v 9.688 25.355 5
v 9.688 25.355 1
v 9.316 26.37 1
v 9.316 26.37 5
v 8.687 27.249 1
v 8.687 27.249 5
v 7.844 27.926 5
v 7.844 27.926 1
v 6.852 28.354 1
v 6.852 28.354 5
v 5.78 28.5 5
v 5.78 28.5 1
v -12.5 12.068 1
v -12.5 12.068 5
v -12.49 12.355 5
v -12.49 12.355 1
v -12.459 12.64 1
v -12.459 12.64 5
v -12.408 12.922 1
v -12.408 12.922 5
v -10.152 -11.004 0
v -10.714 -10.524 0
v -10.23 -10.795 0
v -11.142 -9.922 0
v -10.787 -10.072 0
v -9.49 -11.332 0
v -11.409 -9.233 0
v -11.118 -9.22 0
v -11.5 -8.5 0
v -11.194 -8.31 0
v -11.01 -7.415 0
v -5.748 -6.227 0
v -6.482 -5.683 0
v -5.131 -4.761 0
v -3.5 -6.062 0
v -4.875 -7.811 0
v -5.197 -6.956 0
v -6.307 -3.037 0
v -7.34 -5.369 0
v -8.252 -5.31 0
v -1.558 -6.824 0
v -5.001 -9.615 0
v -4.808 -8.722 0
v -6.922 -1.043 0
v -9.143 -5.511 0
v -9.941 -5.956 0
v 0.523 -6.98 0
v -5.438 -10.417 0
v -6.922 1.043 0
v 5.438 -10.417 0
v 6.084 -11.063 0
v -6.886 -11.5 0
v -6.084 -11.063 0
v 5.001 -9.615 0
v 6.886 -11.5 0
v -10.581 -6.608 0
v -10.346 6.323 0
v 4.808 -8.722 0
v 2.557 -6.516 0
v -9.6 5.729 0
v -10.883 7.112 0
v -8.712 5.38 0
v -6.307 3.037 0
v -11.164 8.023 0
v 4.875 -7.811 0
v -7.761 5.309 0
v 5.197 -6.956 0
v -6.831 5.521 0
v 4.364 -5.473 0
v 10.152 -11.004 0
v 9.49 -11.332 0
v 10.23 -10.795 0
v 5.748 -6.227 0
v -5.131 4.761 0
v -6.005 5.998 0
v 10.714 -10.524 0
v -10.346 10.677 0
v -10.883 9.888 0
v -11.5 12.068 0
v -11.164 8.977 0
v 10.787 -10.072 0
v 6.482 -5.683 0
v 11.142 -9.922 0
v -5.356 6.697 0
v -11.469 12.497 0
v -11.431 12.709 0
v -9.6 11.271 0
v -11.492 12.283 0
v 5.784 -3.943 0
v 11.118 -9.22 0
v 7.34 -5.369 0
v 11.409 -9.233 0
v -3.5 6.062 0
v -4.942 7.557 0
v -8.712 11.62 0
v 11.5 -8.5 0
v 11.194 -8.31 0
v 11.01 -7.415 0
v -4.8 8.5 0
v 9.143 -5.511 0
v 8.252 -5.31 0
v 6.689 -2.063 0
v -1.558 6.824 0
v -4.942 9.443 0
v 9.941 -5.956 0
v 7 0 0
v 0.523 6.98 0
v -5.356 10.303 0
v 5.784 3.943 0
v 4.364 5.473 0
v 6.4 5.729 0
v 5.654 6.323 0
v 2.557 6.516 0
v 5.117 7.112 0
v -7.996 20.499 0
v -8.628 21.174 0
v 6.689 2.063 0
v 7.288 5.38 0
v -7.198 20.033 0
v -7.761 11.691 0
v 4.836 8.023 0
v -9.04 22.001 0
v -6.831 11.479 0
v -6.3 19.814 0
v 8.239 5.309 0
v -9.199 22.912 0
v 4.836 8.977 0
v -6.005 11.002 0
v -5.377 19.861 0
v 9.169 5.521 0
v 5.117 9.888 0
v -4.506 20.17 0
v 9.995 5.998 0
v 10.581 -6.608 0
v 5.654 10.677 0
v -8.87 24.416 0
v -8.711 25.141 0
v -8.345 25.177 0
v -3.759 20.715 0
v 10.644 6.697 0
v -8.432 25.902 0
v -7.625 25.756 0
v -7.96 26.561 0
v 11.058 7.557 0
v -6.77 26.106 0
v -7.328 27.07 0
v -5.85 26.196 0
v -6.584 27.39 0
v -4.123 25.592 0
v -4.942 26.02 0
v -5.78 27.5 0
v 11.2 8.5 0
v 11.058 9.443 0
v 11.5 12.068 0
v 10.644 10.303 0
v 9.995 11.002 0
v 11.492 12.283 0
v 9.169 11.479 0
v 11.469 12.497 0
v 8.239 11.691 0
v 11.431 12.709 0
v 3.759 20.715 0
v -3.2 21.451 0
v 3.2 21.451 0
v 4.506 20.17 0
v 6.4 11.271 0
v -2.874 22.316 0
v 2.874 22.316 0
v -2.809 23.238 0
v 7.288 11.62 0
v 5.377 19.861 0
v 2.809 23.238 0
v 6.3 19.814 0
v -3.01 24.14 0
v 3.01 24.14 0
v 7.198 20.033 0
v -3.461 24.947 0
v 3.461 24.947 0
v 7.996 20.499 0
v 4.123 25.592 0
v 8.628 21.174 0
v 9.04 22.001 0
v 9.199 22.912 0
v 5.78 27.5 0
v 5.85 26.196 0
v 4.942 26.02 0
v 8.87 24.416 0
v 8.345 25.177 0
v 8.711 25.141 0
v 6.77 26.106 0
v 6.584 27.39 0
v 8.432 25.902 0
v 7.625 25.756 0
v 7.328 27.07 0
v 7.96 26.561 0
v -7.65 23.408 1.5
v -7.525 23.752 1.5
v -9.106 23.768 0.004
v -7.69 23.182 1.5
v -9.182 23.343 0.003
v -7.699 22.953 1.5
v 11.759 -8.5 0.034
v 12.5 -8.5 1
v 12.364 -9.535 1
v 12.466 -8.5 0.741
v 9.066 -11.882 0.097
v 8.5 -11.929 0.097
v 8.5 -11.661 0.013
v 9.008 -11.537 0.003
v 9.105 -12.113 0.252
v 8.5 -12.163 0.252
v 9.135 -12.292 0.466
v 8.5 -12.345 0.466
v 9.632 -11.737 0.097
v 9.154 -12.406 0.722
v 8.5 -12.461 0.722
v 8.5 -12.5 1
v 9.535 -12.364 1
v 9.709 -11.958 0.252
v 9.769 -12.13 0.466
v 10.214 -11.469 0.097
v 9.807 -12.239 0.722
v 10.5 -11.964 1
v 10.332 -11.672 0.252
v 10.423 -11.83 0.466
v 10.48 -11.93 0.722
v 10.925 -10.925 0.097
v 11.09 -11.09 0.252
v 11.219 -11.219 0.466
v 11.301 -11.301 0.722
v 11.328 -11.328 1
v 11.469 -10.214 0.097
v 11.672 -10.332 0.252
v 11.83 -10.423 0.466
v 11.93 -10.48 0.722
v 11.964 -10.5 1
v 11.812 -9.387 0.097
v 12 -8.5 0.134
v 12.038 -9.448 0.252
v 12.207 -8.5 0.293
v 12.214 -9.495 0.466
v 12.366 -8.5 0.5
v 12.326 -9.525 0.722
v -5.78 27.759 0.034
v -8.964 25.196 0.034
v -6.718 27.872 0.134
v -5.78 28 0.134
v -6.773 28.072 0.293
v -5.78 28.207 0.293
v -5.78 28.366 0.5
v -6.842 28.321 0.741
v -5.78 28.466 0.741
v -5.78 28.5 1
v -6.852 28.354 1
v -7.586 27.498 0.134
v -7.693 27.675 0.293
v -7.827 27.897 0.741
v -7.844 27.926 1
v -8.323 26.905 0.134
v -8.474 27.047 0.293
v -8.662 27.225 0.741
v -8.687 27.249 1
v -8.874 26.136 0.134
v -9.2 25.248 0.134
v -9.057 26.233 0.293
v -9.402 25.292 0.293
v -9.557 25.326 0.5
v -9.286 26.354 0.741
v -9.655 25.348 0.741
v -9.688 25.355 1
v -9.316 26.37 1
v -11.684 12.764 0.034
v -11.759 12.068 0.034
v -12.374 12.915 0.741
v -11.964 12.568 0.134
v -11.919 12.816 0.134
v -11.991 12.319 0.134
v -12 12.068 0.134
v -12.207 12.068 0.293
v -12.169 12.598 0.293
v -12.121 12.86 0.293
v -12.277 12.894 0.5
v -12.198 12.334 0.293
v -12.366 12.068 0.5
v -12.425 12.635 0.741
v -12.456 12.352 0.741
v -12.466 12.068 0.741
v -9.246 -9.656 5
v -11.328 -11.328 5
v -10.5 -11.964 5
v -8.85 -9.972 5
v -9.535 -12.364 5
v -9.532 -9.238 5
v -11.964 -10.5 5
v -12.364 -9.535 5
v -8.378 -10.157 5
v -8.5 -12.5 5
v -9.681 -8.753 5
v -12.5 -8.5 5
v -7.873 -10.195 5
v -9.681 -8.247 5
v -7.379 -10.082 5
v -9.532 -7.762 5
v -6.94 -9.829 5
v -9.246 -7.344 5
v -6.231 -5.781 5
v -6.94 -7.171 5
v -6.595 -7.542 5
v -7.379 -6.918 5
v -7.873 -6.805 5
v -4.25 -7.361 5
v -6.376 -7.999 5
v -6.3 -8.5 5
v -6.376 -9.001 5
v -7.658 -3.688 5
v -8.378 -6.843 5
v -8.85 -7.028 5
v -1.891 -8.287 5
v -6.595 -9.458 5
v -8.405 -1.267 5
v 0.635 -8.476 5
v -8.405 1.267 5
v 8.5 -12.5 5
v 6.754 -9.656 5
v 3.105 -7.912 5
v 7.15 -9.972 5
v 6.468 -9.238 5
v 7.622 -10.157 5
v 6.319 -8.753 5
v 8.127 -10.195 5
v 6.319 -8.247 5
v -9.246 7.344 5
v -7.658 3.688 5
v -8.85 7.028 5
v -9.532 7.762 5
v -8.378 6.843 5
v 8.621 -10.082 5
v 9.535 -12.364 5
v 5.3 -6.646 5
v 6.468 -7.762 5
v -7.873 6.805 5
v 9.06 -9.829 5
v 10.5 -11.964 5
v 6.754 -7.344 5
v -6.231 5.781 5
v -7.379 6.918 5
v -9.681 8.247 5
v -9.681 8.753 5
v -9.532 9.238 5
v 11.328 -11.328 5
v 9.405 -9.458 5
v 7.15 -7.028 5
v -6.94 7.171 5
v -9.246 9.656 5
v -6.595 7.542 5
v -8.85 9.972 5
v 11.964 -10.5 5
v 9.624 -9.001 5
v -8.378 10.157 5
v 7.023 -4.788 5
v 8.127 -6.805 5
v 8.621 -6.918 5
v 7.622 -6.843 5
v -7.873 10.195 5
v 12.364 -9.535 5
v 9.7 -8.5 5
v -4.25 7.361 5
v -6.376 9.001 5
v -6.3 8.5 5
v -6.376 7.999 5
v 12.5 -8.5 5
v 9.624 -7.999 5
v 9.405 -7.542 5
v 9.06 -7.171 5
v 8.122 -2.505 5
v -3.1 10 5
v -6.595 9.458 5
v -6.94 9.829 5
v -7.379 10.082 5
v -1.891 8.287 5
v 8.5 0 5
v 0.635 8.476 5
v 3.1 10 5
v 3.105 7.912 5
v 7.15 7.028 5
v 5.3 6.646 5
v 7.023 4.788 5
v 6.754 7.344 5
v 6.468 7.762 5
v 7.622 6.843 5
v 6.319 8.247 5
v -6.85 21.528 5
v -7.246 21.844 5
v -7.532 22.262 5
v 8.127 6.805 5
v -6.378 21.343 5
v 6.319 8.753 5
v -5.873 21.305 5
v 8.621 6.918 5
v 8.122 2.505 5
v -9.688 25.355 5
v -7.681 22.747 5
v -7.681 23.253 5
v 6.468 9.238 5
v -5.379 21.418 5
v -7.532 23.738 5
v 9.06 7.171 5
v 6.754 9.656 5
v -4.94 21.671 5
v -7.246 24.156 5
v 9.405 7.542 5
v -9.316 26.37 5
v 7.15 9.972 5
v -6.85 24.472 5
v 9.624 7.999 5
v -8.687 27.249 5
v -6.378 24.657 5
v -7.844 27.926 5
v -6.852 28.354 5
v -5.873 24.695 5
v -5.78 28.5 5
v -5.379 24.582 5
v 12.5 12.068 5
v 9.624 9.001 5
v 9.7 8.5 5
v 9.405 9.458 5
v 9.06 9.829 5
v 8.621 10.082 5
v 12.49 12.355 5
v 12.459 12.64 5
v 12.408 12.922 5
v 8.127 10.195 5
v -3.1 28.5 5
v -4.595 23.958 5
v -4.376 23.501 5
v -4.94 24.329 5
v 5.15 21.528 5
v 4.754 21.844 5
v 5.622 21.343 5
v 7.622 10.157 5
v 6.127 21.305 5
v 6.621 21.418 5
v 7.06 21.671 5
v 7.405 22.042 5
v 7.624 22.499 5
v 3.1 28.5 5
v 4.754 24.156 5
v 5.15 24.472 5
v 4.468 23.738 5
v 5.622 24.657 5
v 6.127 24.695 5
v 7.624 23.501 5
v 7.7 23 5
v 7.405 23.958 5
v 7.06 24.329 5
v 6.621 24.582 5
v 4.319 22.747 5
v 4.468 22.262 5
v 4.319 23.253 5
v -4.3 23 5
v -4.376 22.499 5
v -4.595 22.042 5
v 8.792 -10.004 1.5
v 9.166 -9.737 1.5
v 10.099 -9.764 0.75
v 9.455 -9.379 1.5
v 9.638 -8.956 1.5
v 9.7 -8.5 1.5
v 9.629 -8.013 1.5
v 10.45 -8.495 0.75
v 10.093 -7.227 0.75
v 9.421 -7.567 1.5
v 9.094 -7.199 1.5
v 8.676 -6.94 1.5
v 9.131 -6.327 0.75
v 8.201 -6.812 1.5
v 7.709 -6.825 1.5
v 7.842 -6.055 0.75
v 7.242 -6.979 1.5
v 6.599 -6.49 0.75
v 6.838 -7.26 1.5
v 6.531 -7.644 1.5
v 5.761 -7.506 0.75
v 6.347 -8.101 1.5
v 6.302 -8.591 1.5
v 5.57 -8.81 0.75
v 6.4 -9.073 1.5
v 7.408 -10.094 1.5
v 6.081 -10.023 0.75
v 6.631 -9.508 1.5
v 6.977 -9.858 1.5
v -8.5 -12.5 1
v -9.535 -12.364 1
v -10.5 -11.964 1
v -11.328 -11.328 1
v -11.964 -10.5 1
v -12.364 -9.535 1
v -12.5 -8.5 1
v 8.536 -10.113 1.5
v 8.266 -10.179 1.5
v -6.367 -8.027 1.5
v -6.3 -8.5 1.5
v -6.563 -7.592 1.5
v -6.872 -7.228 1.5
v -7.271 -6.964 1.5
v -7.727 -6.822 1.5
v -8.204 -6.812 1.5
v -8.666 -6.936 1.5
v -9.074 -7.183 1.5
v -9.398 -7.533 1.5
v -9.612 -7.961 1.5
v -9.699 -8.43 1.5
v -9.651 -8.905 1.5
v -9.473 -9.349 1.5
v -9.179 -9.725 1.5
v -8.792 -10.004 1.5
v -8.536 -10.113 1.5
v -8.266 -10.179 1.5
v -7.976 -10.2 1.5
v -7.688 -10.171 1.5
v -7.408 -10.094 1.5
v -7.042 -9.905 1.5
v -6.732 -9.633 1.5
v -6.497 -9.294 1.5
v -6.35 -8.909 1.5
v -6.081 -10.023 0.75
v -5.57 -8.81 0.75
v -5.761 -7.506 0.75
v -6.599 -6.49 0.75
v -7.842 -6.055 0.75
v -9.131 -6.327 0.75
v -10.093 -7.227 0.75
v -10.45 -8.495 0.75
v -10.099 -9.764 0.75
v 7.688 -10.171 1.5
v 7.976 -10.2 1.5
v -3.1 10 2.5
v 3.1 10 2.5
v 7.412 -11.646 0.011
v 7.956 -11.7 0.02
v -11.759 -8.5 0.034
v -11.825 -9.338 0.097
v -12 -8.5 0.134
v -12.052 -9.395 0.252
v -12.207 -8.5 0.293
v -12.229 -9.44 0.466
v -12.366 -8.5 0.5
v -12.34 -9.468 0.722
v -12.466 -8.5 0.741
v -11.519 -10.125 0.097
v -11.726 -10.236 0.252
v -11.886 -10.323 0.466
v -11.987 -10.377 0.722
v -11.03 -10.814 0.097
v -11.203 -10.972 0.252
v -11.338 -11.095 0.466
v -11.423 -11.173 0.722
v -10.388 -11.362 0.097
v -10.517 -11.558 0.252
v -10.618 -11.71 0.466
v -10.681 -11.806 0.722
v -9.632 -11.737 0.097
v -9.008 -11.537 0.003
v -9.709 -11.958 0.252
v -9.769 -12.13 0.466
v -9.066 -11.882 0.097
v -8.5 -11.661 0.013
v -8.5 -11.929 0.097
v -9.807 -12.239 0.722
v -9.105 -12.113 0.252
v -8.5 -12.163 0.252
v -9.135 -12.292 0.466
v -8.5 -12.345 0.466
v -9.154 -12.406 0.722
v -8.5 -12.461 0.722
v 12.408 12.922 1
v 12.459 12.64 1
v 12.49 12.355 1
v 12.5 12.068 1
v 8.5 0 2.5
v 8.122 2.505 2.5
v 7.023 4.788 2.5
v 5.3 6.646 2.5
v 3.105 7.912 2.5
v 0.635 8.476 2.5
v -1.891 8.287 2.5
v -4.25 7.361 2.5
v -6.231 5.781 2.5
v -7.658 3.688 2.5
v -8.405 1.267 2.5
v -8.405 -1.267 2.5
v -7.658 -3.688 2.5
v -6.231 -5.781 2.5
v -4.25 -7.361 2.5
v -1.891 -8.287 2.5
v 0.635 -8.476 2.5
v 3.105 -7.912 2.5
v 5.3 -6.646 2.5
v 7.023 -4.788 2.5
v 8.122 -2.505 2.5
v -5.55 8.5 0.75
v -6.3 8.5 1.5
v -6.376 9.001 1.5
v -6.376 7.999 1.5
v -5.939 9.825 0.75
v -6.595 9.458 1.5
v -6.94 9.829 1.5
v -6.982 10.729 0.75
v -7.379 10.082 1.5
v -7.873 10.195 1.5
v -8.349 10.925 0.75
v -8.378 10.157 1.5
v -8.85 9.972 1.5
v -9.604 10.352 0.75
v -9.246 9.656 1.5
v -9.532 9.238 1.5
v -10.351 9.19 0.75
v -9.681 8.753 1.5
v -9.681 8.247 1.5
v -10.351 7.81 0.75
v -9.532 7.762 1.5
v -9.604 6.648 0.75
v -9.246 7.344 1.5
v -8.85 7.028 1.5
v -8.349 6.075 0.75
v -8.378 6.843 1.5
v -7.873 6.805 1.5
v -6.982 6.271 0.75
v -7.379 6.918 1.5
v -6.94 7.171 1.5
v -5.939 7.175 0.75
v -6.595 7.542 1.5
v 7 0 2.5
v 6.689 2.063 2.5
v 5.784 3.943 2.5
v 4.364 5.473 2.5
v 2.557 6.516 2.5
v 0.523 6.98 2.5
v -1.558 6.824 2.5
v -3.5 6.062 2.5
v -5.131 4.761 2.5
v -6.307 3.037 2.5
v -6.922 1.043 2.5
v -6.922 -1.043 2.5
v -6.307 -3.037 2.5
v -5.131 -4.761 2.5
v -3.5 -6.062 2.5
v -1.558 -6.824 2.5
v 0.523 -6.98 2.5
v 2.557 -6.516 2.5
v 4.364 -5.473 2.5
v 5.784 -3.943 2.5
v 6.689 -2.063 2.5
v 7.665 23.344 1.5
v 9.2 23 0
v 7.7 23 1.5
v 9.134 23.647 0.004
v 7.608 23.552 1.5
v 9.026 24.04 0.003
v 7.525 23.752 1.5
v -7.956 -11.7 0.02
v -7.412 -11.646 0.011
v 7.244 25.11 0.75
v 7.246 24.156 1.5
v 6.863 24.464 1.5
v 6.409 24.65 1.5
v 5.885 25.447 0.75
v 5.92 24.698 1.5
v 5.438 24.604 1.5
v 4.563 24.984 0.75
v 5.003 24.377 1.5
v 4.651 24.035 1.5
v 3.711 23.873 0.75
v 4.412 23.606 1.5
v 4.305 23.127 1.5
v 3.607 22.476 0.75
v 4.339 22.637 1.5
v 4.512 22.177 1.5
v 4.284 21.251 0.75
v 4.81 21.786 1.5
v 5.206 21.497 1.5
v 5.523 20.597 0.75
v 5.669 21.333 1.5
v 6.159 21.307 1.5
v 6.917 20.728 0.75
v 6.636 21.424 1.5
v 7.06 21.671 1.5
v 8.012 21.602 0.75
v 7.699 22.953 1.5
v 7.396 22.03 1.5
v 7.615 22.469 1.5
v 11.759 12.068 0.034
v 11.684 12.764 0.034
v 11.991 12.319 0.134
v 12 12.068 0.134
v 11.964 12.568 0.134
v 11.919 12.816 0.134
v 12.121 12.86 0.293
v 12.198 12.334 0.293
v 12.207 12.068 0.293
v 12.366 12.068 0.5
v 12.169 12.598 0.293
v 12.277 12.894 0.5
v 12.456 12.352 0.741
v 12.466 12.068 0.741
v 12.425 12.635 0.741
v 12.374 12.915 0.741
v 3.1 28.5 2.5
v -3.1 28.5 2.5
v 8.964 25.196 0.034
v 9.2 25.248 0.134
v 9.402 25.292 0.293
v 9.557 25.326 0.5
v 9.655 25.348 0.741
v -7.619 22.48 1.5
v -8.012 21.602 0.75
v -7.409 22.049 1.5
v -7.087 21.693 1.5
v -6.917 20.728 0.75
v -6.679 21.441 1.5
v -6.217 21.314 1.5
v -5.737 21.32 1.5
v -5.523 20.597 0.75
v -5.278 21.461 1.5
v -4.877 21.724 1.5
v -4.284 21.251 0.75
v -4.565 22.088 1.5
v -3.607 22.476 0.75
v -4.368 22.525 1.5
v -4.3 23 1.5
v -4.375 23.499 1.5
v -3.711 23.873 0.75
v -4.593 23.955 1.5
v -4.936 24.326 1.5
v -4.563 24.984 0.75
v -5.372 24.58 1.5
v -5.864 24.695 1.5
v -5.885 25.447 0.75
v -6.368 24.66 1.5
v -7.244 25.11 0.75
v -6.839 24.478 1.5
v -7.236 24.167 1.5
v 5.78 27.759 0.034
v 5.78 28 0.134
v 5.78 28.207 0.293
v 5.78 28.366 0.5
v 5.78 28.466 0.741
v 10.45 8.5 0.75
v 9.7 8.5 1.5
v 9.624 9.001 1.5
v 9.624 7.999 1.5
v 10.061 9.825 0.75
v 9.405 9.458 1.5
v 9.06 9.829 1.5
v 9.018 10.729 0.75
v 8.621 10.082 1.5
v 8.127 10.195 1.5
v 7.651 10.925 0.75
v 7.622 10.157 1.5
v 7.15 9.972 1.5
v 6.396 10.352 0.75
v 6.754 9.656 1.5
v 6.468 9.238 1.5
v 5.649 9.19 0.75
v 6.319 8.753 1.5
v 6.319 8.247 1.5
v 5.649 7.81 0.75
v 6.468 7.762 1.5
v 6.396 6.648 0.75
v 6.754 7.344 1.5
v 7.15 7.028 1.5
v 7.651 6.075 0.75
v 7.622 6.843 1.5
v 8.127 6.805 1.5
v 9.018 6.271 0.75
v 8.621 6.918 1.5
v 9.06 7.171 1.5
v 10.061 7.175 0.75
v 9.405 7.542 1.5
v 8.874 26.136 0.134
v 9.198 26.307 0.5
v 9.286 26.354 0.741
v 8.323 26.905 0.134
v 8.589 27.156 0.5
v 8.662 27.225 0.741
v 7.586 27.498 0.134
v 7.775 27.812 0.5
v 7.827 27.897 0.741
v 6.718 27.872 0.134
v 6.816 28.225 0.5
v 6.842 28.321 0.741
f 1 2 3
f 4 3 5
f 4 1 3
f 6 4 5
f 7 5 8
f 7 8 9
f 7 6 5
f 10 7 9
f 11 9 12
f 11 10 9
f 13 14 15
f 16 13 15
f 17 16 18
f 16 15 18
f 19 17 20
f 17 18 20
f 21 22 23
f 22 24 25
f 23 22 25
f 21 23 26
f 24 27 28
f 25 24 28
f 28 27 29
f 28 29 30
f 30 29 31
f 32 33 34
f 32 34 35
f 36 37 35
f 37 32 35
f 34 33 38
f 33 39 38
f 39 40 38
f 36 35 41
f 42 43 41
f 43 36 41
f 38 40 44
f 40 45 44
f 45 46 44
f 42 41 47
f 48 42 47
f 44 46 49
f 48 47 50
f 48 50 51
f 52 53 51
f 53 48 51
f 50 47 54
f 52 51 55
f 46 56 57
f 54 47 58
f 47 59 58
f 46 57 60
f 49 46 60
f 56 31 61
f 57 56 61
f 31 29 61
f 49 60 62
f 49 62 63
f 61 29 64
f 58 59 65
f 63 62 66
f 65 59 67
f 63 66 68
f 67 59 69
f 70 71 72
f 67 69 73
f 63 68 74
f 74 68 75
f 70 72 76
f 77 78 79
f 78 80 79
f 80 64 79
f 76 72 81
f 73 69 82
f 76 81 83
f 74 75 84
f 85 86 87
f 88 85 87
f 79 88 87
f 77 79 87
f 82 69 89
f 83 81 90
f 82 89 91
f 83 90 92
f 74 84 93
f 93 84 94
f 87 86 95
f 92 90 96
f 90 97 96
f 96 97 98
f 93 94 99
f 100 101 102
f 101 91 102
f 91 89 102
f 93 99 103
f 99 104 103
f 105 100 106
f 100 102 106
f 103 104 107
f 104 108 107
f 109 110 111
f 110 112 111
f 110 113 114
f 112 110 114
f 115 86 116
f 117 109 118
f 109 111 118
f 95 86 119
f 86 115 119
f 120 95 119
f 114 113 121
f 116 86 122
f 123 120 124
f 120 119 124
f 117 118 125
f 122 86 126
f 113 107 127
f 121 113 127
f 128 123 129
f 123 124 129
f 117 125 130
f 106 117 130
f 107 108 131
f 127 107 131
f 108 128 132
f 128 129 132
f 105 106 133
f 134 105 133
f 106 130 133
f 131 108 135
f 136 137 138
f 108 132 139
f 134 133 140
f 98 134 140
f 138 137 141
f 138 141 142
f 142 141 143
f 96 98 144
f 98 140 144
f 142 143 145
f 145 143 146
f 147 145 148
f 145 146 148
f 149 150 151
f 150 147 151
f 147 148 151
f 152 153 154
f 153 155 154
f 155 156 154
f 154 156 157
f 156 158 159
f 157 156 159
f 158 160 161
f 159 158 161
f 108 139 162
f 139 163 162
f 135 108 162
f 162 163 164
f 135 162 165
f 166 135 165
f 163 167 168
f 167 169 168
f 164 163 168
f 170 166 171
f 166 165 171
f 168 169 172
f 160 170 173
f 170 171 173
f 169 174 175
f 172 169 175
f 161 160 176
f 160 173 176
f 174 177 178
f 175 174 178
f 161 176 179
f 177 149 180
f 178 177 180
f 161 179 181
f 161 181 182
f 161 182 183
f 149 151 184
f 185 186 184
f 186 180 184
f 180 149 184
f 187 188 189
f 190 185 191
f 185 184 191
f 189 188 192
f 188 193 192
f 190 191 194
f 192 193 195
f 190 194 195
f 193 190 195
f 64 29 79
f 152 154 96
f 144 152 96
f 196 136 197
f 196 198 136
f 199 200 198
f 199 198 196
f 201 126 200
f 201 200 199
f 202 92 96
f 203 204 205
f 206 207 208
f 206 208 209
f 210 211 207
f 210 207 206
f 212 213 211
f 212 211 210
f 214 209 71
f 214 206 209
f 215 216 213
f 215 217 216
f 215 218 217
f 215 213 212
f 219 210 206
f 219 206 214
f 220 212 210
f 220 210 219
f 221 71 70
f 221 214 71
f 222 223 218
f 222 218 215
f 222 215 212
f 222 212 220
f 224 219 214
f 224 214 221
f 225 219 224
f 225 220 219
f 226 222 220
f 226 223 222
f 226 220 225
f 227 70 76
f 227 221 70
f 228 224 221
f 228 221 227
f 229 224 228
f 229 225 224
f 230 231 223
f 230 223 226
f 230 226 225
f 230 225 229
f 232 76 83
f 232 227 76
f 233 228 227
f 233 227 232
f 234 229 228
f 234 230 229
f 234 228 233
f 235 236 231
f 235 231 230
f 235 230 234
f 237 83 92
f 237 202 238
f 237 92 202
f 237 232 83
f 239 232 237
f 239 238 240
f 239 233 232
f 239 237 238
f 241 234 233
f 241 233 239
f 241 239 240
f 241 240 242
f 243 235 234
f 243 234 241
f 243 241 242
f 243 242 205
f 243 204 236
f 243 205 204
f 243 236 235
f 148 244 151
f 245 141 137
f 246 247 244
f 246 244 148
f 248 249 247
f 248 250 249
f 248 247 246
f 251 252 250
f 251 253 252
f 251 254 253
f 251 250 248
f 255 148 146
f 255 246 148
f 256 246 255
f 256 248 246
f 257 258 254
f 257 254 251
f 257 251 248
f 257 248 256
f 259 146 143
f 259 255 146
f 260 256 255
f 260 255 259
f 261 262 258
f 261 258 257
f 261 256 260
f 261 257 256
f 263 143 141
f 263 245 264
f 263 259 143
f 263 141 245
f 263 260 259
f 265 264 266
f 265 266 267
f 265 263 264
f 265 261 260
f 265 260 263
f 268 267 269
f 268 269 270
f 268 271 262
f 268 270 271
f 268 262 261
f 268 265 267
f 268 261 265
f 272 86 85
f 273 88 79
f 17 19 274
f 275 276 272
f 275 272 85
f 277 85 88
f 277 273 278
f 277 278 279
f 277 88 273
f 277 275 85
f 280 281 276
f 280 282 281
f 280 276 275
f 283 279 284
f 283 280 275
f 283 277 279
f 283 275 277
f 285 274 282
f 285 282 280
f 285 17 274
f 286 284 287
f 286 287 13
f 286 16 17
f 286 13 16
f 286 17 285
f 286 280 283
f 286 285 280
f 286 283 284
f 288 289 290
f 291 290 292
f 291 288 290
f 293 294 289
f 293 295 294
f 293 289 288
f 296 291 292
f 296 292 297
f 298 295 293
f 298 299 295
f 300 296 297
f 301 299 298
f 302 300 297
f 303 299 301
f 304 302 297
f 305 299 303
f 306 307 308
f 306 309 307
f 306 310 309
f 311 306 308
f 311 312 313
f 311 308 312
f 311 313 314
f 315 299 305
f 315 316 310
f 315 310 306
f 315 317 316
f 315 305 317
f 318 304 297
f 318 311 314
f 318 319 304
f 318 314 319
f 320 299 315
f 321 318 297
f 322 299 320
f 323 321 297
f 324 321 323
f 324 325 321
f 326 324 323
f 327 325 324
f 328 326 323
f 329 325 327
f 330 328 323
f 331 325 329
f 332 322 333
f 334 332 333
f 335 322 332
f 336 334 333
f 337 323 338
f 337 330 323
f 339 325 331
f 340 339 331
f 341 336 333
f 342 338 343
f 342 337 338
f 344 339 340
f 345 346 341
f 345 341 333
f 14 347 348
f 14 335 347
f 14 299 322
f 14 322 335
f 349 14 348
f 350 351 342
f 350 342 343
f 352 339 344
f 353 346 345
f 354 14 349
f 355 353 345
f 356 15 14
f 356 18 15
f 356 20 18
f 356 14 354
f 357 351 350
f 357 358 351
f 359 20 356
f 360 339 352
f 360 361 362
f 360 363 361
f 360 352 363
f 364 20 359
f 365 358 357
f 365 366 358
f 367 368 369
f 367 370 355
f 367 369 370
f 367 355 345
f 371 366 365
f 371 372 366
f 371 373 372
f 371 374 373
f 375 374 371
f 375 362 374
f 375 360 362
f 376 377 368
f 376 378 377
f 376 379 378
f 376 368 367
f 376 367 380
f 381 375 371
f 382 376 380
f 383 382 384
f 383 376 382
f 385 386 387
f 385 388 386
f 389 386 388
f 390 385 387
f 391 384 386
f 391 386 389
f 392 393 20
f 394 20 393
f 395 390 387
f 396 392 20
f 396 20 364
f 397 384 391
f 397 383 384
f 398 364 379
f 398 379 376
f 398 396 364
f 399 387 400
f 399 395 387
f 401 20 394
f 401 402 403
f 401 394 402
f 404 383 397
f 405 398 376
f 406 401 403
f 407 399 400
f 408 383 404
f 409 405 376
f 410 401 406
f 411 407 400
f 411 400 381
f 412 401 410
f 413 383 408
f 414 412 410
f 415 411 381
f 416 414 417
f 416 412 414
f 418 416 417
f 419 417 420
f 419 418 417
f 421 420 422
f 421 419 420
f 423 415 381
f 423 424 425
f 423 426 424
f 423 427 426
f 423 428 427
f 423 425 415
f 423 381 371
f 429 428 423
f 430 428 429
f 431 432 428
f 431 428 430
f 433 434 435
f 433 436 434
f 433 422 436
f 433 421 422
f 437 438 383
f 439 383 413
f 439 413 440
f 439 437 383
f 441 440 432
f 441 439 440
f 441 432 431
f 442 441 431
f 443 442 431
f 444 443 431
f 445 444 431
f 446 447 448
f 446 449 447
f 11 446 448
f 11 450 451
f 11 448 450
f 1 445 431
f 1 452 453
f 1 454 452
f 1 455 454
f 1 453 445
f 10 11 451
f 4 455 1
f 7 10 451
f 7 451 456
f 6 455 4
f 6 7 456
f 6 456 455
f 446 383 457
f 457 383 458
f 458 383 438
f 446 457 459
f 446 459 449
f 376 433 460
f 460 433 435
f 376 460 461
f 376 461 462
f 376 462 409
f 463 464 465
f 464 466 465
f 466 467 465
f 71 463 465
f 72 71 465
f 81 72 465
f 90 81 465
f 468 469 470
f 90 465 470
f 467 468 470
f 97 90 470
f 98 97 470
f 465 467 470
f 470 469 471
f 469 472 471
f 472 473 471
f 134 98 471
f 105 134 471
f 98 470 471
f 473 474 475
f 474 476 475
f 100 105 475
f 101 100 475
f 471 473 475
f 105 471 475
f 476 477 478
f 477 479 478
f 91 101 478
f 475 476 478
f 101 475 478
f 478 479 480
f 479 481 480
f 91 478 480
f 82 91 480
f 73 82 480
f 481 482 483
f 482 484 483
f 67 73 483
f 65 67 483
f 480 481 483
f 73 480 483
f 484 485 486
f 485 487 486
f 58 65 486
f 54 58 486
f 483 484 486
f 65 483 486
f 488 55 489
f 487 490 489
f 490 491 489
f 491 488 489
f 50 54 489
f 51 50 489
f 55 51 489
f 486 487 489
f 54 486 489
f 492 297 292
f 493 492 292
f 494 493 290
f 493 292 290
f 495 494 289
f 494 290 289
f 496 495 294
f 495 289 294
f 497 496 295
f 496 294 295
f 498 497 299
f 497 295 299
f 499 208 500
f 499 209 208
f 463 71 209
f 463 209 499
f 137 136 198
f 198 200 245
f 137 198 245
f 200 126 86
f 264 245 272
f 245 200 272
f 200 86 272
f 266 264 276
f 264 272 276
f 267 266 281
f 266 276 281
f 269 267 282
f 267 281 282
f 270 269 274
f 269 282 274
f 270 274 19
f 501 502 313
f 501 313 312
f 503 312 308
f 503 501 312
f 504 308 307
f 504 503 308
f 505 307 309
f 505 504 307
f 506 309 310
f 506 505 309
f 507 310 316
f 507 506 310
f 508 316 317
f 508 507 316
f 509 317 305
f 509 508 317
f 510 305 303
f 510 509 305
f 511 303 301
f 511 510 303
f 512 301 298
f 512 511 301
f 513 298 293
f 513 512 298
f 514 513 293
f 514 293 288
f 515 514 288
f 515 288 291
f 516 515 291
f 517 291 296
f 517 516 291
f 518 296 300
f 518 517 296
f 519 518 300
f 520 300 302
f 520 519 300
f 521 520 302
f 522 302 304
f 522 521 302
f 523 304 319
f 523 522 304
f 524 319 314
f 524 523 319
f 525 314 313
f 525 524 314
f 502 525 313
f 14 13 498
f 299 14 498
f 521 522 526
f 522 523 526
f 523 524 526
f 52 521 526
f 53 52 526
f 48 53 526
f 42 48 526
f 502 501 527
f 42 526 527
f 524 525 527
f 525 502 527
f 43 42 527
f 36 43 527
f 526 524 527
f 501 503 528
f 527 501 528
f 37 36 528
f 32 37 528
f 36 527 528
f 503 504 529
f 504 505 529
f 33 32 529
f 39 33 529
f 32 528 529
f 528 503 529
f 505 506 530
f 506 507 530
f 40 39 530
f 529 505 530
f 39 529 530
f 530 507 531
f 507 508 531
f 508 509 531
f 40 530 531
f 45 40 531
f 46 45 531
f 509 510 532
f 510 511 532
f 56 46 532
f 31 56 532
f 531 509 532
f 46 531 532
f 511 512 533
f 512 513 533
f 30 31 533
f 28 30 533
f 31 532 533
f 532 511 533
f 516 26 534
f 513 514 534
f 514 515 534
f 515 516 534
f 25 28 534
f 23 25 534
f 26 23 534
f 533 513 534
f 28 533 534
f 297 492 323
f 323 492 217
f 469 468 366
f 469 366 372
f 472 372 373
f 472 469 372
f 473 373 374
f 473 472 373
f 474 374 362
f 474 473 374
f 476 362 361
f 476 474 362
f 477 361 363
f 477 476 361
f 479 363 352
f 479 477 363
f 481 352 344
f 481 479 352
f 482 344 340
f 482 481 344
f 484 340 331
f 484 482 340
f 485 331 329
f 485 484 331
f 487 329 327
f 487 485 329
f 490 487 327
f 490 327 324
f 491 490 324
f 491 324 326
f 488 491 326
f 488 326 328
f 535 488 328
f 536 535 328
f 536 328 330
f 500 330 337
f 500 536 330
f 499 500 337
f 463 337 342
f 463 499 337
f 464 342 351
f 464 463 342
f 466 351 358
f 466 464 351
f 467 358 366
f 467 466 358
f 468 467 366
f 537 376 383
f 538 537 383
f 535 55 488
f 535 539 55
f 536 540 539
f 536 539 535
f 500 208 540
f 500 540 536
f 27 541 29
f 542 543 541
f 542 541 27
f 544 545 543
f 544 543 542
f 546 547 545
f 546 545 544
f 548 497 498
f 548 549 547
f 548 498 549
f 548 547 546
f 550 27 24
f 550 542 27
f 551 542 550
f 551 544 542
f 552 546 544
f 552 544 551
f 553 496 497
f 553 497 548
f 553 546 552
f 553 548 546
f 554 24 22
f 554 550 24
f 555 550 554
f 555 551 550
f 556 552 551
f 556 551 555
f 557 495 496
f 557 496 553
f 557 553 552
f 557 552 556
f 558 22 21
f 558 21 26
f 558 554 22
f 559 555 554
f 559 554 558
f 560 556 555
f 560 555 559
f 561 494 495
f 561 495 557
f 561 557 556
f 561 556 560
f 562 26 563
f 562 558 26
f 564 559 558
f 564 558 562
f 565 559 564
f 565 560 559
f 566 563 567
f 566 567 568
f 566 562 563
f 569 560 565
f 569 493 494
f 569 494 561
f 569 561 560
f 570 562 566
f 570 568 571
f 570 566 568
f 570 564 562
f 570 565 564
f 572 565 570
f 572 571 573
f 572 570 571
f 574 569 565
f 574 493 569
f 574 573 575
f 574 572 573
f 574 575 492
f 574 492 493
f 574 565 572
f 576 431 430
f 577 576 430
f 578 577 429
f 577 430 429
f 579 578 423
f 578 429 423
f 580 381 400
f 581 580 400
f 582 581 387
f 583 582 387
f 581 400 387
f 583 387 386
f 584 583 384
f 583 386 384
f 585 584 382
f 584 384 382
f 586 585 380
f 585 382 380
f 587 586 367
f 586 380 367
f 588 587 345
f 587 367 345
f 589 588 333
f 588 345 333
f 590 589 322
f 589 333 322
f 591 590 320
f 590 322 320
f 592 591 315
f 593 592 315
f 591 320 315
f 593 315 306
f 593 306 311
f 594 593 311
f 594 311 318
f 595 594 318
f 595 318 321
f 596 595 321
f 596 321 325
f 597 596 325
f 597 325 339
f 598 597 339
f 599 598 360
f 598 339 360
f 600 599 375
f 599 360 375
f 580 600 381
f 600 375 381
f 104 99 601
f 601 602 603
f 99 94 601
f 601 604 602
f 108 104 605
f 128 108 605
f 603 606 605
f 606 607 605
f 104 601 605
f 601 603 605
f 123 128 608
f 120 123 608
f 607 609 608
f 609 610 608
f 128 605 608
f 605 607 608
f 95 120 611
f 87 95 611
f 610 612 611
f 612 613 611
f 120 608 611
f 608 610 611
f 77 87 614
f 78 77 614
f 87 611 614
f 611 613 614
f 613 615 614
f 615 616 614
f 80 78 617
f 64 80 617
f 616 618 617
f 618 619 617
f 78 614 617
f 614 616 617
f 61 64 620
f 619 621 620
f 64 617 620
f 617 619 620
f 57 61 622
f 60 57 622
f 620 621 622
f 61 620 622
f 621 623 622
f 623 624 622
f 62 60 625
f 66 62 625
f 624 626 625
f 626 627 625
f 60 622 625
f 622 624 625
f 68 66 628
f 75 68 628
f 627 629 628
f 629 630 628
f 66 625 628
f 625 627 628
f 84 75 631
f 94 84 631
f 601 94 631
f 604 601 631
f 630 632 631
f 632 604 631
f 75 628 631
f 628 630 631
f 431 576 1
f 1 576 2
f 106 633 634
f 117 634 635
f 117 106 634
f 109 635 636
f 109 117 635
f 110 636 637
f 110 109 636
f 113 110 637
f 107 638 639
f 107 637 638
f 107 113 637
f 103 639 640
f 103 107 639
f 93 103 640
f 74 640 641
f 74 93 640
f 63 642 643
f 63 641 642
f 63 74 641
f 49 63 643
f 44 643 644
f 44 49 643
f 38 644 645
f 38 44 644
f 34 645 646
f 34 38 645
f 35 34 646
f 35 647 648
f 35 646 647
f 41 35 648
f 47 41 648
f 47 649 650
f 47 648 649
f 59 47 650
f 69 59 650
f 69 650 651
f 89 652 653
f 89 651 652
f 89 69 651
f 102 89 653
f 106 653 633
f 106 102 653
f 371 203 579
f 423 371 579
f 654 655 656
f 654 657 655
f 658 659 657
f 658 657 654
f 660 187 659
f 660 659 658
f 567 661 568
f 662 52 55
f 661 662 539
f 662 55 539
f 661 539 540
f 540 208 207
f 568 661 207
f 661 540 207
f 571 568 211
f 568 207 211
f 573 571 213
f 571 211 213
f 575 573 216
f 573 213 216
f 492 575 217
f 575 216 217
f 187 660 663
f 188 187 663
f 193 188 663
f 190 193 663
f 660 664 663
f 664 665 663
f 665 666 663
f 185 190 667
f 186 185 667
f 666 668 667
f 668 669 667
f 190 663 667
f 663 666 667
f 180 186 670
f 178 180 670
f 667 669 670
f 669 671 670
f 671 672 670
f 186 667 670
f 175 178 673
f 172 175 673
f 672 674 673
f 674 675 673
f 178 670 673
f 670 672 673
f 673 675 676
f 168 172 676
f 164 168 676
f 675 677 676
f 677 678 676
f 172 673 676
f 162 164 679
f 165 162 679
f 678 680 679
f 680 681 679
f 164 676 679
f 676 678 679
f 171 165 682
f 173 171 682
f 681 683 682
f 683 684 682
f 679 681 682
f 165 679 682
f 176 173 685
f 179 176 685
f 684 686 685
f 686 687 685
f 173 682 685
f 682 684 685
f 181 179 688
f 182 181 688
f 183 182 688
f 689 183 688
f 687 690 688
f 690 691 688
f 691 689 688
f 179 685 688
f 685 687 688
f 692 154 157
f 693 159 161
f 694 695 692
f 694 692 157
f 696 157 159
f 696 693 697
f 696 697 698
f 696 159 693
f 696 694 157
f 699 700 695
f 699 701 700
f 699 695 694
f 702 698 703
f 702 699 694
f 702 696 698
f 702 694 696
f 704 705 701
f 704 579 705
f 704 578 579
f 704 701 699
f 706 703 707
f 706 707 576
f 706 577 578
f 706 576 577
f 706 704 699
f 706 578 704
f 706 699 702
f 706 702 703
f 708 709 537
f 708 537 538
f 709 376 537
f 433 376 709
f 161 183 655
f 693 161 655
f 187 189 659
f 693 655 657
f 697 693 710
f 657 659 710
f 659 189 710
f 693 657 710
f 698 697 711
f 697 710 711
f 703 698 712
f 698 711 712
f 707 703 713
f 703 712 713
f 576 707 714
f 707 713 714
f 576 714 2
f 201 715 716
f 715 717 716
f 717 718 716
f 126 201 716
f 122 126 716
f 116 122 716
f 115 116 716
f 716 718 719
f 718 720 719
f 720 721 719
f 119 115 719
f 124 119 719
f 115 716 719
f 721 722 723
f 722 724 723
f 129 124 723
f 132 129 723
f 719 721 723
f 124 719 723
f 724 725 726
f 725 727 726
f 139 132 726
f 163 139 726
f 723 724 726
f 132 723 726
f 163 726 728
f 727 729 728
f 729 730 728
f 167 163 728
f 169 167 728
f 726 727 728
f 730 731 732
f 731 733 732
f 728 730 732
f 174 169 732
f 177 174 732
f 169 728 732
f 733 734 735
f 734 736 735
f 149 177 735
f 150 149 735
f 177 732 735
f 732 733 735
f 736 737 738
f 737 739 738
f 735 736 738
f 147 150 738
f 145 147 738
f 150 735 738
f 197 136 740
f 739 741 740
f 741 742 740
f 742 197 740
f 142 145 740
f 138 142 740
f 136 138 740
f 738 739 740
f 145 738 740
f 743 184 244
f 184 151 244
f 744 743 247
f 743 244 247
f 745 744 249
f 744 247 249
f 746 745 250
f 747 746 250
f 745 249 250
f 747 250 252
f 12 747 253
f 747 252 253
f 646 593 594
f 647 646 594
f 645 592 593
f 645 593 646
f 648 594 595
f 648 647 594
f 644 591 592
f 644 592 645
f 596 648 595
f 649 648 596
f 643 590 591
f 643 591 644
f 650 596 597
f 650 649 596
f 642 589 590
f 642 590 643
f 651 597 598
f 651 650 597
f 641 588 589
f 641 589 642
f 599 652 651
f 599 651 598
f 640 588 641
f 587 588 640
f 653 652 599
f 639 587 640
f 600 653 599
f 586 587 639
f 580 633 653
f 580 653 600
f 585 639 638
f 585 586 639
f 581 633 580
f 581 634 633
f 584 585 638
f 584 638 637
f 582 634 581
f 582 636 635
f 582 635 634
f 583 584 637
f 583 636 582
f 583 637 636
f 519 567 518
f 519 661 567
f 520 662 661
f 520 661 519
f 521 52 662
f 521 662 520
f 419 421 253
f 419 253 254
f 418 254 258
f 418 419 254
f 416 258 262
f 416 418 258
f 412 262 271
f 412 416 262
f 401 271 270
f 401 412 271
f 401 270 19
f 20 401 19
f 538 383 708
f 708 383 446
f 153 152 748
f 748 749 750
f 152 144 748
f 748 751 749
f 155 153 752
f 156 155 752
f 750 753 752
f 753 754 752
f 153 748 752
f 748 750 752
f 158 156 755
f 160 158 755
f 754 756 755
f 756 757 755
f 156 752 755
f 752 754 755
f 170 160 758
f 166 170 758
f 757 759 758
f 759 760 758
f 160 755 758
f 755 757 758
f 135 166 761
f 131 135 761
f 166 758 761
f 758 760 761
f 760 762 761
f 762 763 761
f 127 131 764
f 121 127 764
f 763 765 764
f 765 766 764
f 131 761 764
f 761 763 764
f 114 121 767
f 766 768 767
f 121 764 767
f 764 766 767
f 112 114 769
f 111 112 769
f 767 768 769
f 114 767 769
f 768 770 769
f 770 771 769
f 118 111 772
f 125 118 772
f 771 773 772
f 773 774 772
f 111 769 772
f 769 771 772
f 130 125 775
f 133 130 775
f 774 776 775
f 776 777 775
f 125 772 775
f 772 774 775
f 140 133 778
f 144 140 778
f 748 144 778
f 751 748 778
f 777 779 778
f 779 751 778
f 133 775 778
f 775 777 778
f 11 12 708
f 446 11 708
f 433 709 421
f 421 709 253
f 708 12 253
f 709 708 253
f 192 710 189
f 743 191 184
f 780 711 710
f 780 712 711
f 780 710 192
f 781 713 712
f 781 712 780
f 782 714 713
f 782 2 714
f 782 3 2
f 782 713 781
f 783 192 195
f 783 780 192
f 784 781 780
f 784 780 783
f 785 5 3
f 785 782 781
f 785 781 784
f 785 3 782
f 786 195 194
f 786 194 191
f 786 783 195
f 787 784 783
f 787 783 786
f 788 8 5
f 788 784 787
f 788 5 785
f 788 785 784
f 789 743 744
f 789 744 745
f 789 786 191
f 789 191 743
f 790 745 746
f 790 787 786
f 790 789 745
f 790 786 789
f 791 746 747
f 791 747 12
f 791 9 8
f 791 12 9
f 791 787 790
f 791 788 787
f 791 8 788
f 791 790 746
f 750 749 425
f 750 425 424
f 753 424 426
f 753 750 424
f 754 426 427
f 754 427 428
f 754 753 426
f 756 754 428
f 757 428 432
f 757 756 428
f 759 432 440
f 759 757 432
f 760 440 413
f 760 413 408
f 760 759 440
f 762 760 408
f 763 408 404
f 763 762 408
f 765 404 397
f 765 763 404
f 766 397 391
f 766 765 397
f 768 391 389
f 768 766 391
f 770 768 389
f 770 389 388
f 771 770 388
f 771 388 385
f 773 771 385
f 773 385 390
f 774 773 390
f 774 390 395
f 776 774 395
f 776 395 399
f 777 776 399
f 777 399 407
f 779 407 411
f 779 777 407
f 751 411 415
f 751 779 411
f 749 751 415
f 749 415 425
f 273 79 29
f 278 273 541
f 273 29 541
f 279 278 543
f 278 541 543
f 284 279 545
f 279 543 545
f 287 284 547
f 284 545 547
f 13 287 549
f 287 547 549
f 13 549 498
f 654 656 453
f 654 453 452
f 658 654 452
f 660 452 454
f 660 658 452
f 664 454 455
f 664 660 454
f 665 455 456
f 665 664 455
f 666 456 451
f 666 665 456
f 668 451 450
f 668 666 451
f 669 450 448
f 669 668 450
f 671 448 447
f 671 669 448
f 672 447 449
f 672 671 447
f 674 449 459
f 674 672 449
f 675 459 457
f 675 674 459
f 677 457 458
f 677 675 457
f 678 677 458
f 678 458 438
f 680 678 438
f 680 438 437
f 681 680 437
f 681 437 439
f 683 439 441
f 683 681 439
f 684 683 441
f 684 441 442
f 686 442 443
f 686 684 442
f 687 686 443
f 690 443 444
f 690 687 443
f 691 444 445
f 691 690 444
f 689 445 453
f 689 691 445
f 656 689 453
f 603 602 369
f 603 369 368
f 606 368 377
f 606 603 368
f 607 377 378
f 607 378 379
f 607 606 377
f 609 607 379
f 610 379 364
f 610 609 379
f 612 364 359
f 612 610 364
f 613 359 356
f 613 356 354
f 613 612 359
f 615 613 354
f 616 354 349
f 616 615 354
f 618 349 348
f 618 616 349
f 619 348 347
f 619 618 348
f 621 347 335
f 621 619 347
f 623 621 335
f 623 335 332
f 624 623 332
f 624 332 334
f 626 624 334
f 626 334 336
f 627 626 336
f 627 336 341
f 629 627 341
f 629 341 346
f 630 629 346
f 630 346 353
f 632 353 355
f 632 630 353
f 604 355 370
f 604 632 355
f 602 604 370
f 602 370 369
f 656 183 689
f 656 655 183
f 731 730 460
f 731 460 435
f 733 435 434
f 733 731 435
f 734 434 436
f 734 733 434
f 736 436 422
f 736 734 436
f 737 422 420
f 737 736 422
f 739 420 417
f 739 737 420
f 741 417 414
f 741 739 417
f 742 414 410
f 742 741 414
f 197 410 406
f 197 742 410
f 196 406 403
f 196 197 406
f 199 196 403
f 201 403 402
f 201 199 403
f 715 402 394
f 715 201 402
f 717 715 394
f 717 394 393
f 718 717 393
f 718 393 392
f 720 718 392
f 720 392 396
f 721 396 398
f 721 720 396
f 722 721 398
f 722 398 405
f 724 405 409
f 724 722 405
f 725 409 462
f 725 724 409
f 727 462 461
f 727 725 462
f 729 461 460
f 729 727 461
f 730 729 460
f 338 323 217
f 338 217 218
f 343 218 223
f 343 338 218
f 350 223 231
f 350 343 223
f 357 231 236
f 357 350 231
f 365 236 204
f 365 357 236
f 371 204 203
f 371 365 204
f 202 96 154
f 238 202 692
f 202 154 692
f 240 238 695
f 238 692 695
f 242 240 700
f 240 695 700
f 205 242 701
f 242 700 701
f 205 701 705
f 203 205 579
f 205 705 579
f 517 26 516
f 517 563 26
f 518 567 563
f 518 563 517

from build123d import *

# Parameters (mm, degrees)
SKETCH_R        = 7
SKETCH_R_2      = 1.7
PAD_DEPTH       = 5
SKETCH001_R     = 8.5
SKETCH001_W     = 6.2
SKETCH001_H     = 20
POCKET_DEPTH    = 2.5
FILLET_R        = 4
FILLET001_R     = 4
FILLET002_R     = 4
FILLET003_R     = 4
FILLET004_R     = 4
FILLET005_R     = 4
FILLET006_R     = 1
CHAMFER_SIZE    = 1.5
CHAMFER001_SIZE = 1.5
CHAMFER002_SIZE = 1.5
CHAMFER003_SIZE = 1.5
CHAMFER004_SIZE = 1.5
CHAMFER005_SIZE = 1.5


with BuildPart() as part:
    # Sketch → Pad (new body)
    with BuildSketch(Plane.XY):
        Polygon((-12.5, -12.5), (12.5, -12.5), (12.5, 12.5), (9, 28.5), (-9, 28.5), (-12.5, 12.5), align=None)
        Circle(SKETCH_R, mode=Mode.SUBTRACT)
        with Locations((-8, 8.5)):
            Circle(SKETCH_R_2, mode=Mode.SUBTRACT)
        with Locations((8, 8.5)):
            Circle(SKETCH_R_2, mode=Mode.SUBTRACT)
        with Locations((-8, -8.5)):
            Circle(SKETCH_R_2, mode=Mode.SUBTRACT)
        with Locations((8, -8.5)):
            Circle(SKETCH_R_2, mode=Mode.SUBTRACT)
        with Locations((-6, 23)):
            Circle(SKETCH_R_2, mode=Mode.SUBTRACT)
        with Locations((6, 23)):
            Circle(SKETCH_R_2, mode=Mode.SUBTRACT)
    extrude(amount=PAD_DEPTH)

    # Sketch001 → Pocket (cut)
    with BuildSketch(Plane.XY.offset(5)):
        Circle(SKETCH001_R)
        with Locations((0, 20)):
            Rectangle(SKETCH001_W, SKETCH001_H)
    extrude(amount=-POCKET_DEPTH, mode=Mode.SUBTRACT)

    # Fillet
    fillet_edges = [part.edges().sort_by_distance(p)[0] for p in [
        (-12.5, -12.5, 2.5),
    ]]
    fillet(fillet_edges, radius=FILLET_R)

    # Fillet001
    fillet001_edges = [part.edges().sort_by_distance(p)[0] for p in [
        (12.5, -12.5, 2.5),
    ]]
    fillet(fillet001_edges, radius=FILLET001_R)

    # Fillet002
    fillet002_edges = [part.edges().sort_by_distance(p)[0] for p in [
        (-12.5, 12.5, 2.5),
    ]]
    fillet(fillet002_edges, radius=FILLET002_R)

    # Fillet003
    fillet003_edges = [part.edges().sort_by_distance(p)[0] for p in [
        (12.5, 12.5, 2.5),
    ]]
    fillet(fillet003_edges, radius=FILLET003_R)

    # Fillet004
    fillet004_edges = [part.edges().sort_by_distance(p)[0] for p in [
        (9, 28.5, 2.5),
    ]]
    fillet(fillet004_edges, radius=FILLET004_R)

    # Fillet005
    fillet005_edges = [part.edges().sort_by_distance(p)[0] for p in [
        (-9, 28.5, 2.5),
    ]]
    fillet(fillet005_edges, radius=FILLET005_R)

    # Fillet006
    fillet006_edges = [part.edges().sort_by_distance(p)[0] for p in [
        (0, 28.5, 0),
    ]]
    fillet(fillet006_edges, radius=FILLET006_R)

    # Chamfer
    chamfer_edges = [part.edges().sort_by_distance(p)[0] for p in [
        (-9.7, -8.5, 0),
    ]]
    chamfer(chamfer_edges, length=CHAMFER_SIZE)

    # Chamfer001
    chamfer001_edges = [part.edges().sort_by_distance(p)[0] for p in [
        (-9.7, 8.5, 0),
    ]]
    chamfer(chamfer001_edges, length=CHAMFER001_SIZE)

    # Chamfer002
    chamfer002_edges = [part.edges().sort_by_distance(p)[0] for p in [
        (6.3, -8.5, 0),
    ]]
    chamfer(chamfer002_edges, length=CHAMFER002_SIZE)

    # Chamfer003
    chamfer003_edges = [part.edges().sort_by_distance(p)[0] for p in [
        (6.3, 8.5, 0),
    ]]
    chamfer(chamfer003_edges, length=CHAMFER003_SIZE)

    # Chamfer004
    chamfer004_edges = [part.edges().sort_by_distance(p)[0] for p in [
        (4.3, 23, 0),
    ]]
    chamfer(chamfer004_edges, length=CHAMFER004_SIZE)

    # Chamfer005
    chamfer005_edges = [part.edges().sort_by_distance(p)[0] for p in [
        (-7.7, 23, 0),
    ]]
    chamfer(chamfer005_edges, length=CHAMFER005_SIZE)


solid = part.part
